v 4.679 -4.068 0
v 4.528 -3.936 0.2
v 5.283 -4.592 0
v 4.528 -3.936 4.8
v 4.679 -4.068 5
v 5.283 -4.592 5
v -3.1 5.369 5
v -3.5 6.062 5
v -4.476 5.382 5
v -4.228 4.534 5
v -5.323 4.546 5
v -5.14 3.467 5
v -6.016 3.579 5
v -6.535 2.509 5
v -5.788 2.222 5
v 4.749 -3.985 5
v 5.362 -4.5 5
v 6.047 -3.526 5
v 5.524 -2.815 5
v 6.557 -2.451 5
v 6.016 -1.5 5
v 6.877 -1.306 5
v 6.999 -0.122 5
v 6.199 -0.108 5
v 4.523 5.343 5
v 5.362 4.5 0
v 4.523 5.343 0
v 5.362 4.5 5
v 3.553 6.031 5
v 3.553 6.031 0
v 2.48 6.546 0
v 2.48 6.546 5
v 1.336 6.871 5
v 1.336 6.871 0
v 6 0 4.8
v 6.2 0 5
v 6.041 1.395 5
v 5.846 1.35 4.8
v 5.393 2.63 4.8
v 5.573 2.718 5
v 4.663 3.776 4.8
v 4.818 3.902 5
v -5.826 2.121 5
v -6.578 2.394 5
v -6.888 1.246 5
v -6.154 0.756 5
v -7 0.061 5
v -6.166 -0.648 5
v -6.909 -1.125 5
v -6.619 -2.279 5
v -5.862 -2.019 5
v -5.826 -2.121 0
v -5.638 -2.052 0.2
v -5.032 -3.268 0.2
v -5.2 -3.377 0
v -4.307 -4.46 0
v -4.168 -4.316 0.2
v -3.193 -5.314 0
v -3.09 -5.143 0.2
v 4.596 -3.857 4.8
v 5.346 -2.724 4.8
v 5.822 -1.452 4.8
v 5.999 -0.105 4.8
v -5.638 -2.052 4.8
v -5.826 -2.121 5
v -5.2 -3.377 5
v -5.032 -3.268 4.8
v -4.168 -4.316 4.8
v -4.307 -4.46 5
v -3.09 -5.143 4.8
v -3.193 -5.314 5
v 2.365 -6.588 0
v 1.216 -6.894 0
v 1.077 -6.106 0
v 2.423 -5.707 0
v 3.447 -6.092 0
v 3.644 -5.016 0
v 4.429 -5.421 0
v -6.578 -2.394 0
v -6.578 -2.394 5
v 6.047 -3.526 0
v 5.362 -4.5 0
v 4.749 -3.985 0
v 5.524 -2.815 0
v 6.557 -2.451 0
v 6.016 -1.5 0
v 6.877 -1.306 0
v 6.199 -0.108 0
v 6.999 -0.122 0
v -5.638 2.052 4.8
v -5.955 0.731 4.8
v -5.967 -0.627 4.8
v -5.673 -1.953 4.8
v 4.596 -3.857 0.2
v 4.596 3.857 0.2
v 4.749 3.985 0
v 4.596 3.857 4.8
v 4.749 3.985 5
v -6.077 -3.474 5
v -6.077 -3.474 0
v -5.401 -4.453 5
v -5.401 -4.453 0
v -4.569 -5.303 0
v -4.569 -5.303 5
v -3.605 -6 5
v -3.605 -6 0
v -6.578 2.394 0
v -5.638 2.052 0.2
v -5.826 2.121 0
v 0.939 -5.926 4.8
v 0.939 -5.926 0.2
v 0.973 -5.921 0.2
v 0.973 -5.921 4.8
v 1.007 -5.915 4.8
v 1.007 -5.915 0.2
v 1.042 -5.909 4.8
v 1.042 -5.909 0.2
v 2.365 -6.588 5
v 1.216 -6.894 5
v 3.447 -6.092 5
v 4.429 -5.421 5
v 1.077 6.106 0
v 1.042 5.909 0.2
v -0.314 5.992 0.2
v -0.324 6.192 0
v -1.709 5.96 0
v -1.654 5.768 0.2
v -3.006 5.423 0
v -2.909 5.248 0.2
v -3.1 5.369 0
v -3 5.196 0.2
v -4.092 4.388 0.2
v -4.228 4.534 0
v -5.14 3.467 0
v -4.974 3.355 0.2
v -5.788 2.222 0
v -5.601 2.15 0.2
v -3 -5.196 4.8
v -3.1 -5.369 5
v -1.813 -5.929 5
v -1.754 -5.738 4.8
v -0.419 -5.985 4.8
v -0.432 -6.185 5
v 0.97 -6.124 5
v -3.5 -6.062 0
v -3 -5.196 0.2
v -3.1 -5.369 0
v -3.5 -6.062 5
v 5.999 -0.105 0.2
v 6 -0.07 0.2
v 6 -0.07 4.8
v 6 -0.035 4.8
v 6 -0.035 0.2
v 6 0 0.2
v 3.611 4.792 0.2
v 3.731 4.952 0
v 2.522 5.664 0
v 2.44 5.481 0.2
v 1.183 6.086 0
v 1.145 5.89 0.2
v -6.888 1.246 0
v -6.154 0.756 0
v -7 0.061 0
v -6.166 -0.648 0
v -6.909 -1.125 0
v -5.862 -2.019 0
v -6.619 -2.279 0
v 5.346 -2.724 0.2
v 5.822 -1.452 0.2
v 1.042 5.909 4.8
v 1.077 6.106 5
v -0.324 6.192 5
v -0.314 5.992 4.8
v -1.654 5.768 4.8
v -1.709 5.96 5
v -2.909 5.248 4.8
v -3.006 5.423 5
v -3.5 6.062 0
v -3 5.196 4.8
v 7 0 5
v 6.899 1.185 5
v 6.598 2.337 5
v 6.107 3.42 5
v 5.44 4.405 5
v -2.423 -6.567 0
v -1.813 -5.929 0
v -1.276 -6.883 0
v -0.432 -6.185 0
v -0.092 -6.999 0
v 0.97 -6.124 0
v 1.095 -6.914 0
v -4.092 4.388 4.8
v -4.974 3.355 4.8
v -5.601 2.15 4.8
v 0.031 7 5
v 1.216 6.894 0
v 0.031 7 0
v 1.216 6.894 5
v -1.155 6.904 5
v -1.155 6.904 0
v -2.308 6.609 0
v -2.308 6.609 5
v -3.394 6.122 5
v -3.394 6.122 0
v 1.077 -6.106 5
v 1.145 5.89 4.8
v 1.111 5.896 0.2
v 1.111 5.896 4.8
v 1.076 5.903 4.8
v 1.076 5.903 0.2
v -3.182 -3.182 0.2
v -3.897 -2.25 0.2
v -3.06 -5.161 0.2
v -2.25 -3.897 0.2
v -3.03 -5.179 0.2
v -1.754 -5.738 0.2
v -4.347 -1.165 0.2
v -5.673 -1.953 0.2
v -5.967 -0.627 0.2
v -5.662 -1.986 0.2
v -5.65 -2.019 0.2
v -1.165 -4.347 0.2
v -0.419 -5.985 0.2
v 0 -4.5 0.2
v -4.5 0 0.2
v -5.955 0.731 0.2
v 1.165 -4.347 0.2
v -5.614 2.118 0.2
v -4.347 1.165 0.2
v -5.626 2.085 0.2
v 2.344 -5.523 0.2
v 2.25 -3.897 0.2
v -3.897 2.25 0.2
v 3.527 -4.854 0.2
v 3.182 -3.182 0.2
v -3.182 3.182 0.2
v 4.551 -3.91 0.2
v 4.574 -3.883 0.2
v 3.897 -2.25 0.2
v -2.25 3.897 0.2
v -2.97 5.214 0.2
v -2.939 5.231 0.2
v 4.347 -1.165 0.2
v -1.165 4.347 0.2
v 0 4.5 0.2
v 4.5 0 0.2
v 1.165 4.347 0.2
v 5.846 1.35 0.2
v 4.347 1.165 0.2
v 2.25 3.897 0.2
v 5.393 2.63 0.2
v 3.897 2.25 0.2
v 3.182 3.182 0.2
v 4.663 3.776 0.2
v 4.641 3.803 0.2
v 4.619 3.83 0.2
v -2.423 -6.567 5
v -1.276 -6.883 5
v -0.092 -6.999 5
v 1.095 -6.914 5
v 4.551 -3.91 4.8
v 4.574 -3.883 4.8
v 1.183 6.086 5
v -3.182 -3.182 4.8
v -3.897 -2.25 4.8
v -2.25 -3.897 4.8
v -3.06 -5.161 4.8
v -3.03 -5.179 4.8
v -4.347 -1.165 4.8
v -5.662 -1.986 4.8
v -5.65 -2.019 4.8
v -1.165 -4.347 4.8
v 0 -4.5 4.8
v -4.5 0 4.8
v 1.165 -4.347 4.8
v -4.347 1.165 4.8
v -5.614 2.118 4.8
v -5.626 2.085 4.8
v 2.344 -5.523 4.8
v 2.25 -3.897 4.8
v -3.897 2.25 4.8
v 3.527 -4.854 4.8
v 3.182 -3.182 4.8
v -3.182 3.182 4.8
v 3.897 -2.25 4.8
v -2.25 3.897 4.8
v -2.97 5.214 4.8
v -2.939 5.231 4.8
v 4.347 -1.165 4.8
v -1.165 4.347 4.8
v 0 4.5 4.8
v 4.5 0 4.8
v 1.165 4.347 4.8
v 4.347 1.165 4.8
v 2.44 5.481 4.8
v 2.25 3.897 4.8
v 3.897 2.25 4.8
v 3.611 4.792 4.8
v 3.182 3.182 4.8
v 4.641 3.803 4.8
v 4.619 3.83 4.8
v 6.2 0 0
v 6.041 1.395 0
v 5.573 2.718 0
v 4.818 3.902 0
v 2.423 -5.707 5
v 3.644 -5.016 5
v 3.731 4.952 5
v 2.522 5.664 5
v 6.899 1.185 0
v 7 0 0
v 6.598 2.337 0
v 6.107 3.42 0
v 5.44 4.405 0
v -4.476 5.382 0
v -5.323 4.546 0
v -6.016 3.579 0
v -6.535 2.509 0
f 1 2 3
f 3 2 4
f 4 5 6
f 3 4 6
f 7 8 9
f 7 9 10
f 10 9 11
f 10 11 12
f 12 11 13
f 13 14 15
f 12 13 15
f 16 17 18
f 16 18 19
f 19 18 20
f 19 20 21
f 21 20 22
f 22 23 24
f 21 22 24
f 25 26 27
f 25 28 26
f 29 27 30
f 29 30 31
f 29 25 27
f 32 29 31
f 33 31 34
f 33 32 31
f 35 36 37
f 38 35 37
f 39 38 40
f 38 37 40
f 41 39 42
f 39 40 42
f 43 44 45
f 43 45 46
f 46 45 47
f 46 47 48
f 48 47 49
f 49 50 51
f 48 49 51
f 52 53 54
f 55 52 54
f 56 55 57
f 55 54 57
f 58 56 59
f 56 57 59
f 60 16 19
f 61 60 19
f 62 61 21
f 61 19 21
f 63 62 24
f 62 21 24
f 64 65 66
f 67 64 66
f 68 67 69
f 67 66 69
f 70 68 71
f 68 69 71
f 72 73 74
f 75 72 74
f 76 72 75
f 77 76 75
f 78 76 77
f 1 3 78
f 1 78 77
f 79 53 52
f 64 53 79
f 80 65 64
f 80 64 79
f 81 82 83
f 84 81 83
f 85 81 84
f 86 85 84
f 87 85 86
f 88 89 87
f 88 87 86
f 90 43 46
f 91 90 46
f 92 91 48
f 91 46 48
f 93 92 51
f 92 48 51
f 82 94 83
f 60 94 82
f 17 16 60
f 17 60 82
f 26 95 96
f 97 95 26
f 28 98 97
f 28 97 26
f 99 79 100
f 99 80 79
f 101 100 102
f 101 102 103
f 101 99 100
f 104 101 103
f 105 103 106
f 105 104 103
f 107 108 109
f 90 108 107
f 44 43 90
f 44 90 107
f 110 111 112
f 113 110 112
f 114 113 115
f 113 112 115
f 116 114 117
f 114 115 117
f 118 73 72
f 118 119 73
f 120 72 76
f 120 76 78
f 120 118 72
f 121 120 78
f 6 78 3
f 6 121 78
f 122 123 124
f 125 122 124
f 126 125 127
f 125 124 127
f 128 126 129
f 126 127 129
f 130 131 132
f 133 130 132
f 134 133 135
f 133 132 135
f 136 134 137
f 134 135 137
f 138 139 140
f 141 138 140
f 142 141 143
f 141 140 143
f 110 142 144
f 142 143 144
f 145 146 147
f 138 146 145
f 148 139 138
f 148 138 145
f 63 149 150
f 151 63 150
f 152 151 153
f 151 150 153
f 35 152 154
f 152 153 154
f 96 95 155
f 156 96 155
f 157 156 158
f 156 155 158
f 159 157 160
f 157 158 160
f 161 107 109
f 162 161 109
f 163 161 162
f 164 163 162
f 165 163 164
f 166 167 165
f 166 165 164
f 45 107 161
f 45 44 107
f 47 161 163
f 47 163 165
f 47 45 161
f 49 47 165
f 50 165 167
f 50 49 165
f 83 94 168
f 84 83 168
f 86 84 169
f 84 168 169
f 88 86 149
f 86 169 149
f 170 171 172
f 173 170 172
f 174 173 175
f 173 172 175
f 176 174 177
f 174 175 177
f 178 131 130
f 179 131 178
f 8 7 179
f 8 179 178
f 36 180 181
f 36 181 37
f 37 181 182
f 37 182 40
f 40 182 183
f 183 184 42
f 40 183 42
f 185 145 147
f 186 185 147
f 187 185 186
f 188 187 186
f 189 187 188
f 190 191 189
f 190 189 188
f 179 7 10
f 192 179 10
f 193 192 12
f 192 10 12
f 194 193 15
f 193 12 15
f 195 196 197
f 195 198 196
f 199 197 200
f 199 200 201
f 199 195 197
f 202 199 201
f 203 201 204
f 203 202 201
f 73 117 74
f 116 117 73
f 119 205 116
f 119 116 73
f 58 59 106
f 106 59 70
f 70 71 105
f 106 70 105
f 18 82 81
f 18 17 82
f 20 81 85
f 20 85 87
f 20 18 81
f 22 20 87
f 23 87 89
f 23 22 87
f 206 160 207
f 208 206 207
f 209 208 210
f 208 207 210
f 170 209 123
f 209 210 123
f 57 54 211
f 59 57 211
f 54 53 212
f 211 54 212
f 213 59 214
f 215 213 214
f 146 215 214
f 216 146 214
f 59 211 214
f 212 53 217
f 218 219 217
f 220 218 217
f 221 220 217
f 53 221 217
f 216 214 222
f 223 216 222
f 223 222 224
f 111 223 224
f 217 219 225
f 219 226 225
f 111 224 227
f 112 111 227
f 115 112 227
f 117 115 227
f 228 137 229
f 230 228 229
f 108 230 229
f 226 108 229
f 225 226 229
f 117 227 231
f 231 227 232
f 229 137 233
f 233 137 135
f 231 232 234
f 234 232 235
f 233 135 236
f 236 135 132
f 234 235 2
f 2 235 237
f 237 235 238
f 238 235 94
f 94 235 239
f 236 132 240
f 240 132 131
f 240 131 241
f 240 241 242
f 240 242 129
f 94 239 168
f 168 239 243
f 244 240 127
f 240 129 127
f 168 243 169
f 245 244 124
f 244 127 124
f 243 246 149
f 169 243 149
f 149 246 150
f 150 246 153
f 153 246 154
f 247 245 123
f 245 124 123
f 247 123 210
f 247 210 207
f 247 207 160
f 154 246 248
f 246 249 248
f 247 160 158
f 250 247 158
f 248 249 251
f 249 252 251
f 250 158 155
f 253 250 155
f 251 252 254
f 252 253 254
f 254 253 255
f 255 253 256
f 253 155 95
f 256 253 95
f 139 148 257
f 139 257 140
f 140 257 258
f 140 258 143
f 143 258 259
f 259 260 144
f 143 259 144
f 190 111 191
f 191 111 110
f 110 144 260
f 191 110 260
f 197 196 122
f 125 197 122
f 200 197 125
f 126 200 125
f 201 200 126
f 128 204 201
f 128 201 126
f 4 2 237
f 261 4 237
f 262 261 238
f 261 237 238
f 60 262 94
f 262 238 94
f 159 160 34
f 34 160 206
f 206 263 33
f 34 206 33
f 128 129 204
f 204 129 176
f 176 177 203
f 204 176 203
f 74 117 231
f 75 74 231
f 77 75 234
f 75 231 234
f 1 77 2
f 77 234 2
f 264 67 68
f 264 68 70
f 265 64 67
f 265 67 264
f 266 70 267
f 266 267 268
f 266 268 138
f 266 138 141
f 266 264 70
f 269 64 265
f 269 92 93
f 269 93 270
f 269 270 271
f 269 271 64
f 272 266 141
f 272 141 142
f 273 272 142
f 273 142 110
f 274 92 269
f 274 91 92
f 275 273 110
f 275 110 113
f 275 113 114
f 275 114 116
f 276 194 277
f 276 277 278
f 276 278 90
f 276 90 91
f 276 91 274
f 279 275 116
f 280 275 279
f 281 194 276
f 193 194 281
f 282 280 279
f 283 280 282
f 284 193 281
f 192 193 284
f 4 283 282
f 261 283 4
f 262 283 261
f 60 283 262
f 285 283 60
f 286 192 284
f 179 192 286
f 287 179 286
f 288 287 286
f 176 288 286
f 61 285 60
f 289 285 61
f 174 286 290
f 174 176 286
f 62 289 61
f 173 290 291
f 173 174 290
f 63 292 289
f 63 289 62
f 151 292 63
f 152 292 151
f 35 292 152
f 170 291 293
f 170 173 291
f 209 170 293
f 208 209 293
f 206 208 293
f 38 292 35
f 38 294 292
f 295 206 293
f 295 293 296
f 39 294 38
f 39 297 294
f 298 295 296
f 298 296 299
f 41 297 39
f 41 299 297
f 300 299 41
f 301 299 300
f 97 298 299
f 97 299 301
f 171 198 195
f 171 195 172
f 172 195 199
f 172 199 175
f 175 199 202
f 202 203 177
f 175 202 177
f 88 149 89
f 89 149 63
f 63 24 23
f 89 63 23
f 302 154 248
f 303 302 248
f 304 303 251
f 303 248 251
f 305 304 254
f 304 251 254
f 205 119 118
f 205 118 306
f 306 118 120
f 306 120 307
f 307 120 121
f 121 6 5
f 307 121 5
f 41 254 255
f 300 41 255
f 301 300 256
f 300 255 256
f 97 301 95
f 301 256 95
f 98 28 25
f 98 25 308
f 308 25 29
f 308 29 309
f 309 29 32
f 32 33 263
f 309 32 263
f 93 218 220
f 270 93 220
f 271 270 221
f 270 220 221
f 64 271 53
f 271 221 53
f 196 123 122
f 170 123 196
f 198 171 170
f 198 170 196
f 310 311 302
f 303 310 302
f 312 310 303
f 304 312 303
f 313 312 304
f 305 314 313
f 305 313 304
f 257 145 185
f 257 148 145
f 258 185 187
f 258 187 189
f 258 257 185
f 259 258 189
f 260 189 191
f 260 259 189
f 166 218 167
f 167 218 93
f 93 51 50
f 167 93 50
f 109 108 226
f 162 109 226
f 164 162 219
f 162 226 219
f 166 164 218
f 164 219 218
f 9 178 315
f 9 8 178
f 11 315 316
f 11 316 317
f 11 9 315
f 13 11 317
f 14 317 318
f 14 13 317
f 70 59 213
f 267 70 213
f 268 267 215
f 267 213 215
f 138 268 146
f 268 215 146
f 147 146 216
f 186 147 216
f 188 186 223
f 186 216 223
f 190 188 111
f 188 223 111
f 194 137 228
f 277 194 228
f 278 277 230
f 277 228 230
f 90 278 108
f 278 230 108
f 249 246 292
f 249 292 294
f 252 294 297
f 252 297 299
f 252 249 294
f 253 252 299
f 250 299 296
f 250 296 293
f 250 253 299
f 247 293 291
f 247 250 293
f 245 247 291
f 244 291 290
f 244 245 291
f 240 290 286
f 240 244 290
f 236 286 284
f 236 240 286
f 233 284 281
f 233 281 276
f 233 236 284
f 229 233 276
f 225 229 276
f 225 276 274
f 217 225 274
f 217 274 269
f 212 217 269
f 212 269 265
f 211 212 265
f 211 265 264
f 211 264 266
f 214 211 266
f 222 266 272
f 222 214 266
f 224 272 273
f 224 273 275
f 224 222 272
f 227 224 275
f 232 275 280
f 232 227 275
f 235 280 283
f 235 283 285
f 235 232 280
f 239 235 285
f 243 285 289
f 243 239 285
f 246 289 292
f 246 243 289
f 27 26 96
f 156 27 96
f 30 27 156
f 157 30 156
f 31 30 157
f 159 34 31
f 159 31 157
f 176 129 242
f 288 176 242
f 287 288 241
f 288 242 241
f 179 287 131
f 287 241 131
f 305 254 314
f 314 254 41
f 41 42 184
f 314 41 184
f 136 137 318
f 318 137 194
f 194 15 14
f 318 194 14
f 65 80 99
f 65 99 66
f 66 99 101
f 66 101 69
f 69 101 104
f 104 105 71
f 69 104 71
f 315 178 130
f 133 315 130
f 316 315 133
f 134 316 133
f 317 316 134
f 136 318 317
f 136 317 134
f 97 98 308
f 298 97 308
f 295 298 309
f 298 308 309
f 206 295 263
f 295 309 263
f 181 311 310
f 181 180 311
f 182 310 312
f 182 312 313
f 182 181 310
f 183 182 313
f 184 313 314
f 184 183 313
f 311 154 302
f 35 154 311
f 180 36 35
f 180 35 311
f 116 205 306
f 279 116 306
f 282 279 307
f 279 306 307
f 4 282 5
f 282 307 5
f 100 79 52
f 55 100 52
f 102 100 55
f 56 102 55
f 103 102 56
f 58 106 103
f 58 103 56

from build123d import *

# Parameters (mm, degrees)
CYLINDER015_R     = 4.5
CYLINDER015_DEPTH = 4.6
CYLINDER014_R     = 6
CYLINDER014_DEPTH = 4.6
CYLINDER013_W     = 6
CYLINDER013_H     = 5
CYLINDER013_ANGLE = 39
CYLINDER012_W     = 7
CYLINDER012_H     = 5
CYLINDER012_ANGLE = 39
CHAMFER007_SIZE   = 0.2
ARRAY001_COUNT    = 9


with BuildPart() as cilindro011:
    # Cylinder015 → Cylinder015 (new body)
    with BuildSketch(Plane.XY.offset(0.2)):
        Circle(CYLINDER015_R)
    extrude(amount=CYLINDER015_DEPTH)


with BuildPart() as cut007:
    # Cylinder014 → Cylinder014 (new body)
    with BuildSketch(Plane.XY.offset(0.2)):
        Circle(CYLINDER014_R)
    extrude(amount=CYLINDER014_DEPTH)

    # Cut007: cut Cilindro011
    add(cilindro011.part, mode=Mode.SUBTRACT)


with BuildPart() as cilindro009:
    # Cylinder013 → Cylinder013 (revolve)
    with BuildSketch(Plane.XZ):
        with Locations((3, 2.5)):
            Rectangle(CYLINDER013_W, CYLINDER013_H)
    revolve(axis=Axis((0, 0, 0), (0, 0, 1)), revolution_arc=CYLINDER013_ANGLE)


with BuildPart() as medio001:
    # Cylinder012 → Cylinder012 (revolve)
    with BuildSketch(Plane.XZ):
        with Locations((3.5, 2.5)):
            Rectangle(CYLINDER012_W, CYLINDER012_H)
    revolve(axis=Axis((0, 0, 0), (0, 0, 1)), revolution_arc=CYLINDER012_ANGLE)

    # Cut006: cut Cilindro009
    add(cilindro009.part, mode=Mode.SUBTRACT)

    # Chamfer007
    chamfer007_edges = [medio001.edges().sort_by_distance(p)[0] for p in [
        (5.655849, 2.002841, 5),
        (5.655849, 2.002841, 0),
    ]]
    chamfer(chamfer007_edges, length=CHAMFER007_SIZE)

    # Array001: Medio001 ×9 about axis
    array001_axis = Axis((0, 0, 0), (0, 0, 1))


with BuildPart() as medio001_1:
    add(medio001.part)
    for i in range(1, ARRAY001_COUNT):
        add(medio001.part.rotate(array001_axis, i * 360 / ARRAY001_COUNT))

    # Fusion001: union Cut007
    add(cut007.part)


solid = medio001_1.part
